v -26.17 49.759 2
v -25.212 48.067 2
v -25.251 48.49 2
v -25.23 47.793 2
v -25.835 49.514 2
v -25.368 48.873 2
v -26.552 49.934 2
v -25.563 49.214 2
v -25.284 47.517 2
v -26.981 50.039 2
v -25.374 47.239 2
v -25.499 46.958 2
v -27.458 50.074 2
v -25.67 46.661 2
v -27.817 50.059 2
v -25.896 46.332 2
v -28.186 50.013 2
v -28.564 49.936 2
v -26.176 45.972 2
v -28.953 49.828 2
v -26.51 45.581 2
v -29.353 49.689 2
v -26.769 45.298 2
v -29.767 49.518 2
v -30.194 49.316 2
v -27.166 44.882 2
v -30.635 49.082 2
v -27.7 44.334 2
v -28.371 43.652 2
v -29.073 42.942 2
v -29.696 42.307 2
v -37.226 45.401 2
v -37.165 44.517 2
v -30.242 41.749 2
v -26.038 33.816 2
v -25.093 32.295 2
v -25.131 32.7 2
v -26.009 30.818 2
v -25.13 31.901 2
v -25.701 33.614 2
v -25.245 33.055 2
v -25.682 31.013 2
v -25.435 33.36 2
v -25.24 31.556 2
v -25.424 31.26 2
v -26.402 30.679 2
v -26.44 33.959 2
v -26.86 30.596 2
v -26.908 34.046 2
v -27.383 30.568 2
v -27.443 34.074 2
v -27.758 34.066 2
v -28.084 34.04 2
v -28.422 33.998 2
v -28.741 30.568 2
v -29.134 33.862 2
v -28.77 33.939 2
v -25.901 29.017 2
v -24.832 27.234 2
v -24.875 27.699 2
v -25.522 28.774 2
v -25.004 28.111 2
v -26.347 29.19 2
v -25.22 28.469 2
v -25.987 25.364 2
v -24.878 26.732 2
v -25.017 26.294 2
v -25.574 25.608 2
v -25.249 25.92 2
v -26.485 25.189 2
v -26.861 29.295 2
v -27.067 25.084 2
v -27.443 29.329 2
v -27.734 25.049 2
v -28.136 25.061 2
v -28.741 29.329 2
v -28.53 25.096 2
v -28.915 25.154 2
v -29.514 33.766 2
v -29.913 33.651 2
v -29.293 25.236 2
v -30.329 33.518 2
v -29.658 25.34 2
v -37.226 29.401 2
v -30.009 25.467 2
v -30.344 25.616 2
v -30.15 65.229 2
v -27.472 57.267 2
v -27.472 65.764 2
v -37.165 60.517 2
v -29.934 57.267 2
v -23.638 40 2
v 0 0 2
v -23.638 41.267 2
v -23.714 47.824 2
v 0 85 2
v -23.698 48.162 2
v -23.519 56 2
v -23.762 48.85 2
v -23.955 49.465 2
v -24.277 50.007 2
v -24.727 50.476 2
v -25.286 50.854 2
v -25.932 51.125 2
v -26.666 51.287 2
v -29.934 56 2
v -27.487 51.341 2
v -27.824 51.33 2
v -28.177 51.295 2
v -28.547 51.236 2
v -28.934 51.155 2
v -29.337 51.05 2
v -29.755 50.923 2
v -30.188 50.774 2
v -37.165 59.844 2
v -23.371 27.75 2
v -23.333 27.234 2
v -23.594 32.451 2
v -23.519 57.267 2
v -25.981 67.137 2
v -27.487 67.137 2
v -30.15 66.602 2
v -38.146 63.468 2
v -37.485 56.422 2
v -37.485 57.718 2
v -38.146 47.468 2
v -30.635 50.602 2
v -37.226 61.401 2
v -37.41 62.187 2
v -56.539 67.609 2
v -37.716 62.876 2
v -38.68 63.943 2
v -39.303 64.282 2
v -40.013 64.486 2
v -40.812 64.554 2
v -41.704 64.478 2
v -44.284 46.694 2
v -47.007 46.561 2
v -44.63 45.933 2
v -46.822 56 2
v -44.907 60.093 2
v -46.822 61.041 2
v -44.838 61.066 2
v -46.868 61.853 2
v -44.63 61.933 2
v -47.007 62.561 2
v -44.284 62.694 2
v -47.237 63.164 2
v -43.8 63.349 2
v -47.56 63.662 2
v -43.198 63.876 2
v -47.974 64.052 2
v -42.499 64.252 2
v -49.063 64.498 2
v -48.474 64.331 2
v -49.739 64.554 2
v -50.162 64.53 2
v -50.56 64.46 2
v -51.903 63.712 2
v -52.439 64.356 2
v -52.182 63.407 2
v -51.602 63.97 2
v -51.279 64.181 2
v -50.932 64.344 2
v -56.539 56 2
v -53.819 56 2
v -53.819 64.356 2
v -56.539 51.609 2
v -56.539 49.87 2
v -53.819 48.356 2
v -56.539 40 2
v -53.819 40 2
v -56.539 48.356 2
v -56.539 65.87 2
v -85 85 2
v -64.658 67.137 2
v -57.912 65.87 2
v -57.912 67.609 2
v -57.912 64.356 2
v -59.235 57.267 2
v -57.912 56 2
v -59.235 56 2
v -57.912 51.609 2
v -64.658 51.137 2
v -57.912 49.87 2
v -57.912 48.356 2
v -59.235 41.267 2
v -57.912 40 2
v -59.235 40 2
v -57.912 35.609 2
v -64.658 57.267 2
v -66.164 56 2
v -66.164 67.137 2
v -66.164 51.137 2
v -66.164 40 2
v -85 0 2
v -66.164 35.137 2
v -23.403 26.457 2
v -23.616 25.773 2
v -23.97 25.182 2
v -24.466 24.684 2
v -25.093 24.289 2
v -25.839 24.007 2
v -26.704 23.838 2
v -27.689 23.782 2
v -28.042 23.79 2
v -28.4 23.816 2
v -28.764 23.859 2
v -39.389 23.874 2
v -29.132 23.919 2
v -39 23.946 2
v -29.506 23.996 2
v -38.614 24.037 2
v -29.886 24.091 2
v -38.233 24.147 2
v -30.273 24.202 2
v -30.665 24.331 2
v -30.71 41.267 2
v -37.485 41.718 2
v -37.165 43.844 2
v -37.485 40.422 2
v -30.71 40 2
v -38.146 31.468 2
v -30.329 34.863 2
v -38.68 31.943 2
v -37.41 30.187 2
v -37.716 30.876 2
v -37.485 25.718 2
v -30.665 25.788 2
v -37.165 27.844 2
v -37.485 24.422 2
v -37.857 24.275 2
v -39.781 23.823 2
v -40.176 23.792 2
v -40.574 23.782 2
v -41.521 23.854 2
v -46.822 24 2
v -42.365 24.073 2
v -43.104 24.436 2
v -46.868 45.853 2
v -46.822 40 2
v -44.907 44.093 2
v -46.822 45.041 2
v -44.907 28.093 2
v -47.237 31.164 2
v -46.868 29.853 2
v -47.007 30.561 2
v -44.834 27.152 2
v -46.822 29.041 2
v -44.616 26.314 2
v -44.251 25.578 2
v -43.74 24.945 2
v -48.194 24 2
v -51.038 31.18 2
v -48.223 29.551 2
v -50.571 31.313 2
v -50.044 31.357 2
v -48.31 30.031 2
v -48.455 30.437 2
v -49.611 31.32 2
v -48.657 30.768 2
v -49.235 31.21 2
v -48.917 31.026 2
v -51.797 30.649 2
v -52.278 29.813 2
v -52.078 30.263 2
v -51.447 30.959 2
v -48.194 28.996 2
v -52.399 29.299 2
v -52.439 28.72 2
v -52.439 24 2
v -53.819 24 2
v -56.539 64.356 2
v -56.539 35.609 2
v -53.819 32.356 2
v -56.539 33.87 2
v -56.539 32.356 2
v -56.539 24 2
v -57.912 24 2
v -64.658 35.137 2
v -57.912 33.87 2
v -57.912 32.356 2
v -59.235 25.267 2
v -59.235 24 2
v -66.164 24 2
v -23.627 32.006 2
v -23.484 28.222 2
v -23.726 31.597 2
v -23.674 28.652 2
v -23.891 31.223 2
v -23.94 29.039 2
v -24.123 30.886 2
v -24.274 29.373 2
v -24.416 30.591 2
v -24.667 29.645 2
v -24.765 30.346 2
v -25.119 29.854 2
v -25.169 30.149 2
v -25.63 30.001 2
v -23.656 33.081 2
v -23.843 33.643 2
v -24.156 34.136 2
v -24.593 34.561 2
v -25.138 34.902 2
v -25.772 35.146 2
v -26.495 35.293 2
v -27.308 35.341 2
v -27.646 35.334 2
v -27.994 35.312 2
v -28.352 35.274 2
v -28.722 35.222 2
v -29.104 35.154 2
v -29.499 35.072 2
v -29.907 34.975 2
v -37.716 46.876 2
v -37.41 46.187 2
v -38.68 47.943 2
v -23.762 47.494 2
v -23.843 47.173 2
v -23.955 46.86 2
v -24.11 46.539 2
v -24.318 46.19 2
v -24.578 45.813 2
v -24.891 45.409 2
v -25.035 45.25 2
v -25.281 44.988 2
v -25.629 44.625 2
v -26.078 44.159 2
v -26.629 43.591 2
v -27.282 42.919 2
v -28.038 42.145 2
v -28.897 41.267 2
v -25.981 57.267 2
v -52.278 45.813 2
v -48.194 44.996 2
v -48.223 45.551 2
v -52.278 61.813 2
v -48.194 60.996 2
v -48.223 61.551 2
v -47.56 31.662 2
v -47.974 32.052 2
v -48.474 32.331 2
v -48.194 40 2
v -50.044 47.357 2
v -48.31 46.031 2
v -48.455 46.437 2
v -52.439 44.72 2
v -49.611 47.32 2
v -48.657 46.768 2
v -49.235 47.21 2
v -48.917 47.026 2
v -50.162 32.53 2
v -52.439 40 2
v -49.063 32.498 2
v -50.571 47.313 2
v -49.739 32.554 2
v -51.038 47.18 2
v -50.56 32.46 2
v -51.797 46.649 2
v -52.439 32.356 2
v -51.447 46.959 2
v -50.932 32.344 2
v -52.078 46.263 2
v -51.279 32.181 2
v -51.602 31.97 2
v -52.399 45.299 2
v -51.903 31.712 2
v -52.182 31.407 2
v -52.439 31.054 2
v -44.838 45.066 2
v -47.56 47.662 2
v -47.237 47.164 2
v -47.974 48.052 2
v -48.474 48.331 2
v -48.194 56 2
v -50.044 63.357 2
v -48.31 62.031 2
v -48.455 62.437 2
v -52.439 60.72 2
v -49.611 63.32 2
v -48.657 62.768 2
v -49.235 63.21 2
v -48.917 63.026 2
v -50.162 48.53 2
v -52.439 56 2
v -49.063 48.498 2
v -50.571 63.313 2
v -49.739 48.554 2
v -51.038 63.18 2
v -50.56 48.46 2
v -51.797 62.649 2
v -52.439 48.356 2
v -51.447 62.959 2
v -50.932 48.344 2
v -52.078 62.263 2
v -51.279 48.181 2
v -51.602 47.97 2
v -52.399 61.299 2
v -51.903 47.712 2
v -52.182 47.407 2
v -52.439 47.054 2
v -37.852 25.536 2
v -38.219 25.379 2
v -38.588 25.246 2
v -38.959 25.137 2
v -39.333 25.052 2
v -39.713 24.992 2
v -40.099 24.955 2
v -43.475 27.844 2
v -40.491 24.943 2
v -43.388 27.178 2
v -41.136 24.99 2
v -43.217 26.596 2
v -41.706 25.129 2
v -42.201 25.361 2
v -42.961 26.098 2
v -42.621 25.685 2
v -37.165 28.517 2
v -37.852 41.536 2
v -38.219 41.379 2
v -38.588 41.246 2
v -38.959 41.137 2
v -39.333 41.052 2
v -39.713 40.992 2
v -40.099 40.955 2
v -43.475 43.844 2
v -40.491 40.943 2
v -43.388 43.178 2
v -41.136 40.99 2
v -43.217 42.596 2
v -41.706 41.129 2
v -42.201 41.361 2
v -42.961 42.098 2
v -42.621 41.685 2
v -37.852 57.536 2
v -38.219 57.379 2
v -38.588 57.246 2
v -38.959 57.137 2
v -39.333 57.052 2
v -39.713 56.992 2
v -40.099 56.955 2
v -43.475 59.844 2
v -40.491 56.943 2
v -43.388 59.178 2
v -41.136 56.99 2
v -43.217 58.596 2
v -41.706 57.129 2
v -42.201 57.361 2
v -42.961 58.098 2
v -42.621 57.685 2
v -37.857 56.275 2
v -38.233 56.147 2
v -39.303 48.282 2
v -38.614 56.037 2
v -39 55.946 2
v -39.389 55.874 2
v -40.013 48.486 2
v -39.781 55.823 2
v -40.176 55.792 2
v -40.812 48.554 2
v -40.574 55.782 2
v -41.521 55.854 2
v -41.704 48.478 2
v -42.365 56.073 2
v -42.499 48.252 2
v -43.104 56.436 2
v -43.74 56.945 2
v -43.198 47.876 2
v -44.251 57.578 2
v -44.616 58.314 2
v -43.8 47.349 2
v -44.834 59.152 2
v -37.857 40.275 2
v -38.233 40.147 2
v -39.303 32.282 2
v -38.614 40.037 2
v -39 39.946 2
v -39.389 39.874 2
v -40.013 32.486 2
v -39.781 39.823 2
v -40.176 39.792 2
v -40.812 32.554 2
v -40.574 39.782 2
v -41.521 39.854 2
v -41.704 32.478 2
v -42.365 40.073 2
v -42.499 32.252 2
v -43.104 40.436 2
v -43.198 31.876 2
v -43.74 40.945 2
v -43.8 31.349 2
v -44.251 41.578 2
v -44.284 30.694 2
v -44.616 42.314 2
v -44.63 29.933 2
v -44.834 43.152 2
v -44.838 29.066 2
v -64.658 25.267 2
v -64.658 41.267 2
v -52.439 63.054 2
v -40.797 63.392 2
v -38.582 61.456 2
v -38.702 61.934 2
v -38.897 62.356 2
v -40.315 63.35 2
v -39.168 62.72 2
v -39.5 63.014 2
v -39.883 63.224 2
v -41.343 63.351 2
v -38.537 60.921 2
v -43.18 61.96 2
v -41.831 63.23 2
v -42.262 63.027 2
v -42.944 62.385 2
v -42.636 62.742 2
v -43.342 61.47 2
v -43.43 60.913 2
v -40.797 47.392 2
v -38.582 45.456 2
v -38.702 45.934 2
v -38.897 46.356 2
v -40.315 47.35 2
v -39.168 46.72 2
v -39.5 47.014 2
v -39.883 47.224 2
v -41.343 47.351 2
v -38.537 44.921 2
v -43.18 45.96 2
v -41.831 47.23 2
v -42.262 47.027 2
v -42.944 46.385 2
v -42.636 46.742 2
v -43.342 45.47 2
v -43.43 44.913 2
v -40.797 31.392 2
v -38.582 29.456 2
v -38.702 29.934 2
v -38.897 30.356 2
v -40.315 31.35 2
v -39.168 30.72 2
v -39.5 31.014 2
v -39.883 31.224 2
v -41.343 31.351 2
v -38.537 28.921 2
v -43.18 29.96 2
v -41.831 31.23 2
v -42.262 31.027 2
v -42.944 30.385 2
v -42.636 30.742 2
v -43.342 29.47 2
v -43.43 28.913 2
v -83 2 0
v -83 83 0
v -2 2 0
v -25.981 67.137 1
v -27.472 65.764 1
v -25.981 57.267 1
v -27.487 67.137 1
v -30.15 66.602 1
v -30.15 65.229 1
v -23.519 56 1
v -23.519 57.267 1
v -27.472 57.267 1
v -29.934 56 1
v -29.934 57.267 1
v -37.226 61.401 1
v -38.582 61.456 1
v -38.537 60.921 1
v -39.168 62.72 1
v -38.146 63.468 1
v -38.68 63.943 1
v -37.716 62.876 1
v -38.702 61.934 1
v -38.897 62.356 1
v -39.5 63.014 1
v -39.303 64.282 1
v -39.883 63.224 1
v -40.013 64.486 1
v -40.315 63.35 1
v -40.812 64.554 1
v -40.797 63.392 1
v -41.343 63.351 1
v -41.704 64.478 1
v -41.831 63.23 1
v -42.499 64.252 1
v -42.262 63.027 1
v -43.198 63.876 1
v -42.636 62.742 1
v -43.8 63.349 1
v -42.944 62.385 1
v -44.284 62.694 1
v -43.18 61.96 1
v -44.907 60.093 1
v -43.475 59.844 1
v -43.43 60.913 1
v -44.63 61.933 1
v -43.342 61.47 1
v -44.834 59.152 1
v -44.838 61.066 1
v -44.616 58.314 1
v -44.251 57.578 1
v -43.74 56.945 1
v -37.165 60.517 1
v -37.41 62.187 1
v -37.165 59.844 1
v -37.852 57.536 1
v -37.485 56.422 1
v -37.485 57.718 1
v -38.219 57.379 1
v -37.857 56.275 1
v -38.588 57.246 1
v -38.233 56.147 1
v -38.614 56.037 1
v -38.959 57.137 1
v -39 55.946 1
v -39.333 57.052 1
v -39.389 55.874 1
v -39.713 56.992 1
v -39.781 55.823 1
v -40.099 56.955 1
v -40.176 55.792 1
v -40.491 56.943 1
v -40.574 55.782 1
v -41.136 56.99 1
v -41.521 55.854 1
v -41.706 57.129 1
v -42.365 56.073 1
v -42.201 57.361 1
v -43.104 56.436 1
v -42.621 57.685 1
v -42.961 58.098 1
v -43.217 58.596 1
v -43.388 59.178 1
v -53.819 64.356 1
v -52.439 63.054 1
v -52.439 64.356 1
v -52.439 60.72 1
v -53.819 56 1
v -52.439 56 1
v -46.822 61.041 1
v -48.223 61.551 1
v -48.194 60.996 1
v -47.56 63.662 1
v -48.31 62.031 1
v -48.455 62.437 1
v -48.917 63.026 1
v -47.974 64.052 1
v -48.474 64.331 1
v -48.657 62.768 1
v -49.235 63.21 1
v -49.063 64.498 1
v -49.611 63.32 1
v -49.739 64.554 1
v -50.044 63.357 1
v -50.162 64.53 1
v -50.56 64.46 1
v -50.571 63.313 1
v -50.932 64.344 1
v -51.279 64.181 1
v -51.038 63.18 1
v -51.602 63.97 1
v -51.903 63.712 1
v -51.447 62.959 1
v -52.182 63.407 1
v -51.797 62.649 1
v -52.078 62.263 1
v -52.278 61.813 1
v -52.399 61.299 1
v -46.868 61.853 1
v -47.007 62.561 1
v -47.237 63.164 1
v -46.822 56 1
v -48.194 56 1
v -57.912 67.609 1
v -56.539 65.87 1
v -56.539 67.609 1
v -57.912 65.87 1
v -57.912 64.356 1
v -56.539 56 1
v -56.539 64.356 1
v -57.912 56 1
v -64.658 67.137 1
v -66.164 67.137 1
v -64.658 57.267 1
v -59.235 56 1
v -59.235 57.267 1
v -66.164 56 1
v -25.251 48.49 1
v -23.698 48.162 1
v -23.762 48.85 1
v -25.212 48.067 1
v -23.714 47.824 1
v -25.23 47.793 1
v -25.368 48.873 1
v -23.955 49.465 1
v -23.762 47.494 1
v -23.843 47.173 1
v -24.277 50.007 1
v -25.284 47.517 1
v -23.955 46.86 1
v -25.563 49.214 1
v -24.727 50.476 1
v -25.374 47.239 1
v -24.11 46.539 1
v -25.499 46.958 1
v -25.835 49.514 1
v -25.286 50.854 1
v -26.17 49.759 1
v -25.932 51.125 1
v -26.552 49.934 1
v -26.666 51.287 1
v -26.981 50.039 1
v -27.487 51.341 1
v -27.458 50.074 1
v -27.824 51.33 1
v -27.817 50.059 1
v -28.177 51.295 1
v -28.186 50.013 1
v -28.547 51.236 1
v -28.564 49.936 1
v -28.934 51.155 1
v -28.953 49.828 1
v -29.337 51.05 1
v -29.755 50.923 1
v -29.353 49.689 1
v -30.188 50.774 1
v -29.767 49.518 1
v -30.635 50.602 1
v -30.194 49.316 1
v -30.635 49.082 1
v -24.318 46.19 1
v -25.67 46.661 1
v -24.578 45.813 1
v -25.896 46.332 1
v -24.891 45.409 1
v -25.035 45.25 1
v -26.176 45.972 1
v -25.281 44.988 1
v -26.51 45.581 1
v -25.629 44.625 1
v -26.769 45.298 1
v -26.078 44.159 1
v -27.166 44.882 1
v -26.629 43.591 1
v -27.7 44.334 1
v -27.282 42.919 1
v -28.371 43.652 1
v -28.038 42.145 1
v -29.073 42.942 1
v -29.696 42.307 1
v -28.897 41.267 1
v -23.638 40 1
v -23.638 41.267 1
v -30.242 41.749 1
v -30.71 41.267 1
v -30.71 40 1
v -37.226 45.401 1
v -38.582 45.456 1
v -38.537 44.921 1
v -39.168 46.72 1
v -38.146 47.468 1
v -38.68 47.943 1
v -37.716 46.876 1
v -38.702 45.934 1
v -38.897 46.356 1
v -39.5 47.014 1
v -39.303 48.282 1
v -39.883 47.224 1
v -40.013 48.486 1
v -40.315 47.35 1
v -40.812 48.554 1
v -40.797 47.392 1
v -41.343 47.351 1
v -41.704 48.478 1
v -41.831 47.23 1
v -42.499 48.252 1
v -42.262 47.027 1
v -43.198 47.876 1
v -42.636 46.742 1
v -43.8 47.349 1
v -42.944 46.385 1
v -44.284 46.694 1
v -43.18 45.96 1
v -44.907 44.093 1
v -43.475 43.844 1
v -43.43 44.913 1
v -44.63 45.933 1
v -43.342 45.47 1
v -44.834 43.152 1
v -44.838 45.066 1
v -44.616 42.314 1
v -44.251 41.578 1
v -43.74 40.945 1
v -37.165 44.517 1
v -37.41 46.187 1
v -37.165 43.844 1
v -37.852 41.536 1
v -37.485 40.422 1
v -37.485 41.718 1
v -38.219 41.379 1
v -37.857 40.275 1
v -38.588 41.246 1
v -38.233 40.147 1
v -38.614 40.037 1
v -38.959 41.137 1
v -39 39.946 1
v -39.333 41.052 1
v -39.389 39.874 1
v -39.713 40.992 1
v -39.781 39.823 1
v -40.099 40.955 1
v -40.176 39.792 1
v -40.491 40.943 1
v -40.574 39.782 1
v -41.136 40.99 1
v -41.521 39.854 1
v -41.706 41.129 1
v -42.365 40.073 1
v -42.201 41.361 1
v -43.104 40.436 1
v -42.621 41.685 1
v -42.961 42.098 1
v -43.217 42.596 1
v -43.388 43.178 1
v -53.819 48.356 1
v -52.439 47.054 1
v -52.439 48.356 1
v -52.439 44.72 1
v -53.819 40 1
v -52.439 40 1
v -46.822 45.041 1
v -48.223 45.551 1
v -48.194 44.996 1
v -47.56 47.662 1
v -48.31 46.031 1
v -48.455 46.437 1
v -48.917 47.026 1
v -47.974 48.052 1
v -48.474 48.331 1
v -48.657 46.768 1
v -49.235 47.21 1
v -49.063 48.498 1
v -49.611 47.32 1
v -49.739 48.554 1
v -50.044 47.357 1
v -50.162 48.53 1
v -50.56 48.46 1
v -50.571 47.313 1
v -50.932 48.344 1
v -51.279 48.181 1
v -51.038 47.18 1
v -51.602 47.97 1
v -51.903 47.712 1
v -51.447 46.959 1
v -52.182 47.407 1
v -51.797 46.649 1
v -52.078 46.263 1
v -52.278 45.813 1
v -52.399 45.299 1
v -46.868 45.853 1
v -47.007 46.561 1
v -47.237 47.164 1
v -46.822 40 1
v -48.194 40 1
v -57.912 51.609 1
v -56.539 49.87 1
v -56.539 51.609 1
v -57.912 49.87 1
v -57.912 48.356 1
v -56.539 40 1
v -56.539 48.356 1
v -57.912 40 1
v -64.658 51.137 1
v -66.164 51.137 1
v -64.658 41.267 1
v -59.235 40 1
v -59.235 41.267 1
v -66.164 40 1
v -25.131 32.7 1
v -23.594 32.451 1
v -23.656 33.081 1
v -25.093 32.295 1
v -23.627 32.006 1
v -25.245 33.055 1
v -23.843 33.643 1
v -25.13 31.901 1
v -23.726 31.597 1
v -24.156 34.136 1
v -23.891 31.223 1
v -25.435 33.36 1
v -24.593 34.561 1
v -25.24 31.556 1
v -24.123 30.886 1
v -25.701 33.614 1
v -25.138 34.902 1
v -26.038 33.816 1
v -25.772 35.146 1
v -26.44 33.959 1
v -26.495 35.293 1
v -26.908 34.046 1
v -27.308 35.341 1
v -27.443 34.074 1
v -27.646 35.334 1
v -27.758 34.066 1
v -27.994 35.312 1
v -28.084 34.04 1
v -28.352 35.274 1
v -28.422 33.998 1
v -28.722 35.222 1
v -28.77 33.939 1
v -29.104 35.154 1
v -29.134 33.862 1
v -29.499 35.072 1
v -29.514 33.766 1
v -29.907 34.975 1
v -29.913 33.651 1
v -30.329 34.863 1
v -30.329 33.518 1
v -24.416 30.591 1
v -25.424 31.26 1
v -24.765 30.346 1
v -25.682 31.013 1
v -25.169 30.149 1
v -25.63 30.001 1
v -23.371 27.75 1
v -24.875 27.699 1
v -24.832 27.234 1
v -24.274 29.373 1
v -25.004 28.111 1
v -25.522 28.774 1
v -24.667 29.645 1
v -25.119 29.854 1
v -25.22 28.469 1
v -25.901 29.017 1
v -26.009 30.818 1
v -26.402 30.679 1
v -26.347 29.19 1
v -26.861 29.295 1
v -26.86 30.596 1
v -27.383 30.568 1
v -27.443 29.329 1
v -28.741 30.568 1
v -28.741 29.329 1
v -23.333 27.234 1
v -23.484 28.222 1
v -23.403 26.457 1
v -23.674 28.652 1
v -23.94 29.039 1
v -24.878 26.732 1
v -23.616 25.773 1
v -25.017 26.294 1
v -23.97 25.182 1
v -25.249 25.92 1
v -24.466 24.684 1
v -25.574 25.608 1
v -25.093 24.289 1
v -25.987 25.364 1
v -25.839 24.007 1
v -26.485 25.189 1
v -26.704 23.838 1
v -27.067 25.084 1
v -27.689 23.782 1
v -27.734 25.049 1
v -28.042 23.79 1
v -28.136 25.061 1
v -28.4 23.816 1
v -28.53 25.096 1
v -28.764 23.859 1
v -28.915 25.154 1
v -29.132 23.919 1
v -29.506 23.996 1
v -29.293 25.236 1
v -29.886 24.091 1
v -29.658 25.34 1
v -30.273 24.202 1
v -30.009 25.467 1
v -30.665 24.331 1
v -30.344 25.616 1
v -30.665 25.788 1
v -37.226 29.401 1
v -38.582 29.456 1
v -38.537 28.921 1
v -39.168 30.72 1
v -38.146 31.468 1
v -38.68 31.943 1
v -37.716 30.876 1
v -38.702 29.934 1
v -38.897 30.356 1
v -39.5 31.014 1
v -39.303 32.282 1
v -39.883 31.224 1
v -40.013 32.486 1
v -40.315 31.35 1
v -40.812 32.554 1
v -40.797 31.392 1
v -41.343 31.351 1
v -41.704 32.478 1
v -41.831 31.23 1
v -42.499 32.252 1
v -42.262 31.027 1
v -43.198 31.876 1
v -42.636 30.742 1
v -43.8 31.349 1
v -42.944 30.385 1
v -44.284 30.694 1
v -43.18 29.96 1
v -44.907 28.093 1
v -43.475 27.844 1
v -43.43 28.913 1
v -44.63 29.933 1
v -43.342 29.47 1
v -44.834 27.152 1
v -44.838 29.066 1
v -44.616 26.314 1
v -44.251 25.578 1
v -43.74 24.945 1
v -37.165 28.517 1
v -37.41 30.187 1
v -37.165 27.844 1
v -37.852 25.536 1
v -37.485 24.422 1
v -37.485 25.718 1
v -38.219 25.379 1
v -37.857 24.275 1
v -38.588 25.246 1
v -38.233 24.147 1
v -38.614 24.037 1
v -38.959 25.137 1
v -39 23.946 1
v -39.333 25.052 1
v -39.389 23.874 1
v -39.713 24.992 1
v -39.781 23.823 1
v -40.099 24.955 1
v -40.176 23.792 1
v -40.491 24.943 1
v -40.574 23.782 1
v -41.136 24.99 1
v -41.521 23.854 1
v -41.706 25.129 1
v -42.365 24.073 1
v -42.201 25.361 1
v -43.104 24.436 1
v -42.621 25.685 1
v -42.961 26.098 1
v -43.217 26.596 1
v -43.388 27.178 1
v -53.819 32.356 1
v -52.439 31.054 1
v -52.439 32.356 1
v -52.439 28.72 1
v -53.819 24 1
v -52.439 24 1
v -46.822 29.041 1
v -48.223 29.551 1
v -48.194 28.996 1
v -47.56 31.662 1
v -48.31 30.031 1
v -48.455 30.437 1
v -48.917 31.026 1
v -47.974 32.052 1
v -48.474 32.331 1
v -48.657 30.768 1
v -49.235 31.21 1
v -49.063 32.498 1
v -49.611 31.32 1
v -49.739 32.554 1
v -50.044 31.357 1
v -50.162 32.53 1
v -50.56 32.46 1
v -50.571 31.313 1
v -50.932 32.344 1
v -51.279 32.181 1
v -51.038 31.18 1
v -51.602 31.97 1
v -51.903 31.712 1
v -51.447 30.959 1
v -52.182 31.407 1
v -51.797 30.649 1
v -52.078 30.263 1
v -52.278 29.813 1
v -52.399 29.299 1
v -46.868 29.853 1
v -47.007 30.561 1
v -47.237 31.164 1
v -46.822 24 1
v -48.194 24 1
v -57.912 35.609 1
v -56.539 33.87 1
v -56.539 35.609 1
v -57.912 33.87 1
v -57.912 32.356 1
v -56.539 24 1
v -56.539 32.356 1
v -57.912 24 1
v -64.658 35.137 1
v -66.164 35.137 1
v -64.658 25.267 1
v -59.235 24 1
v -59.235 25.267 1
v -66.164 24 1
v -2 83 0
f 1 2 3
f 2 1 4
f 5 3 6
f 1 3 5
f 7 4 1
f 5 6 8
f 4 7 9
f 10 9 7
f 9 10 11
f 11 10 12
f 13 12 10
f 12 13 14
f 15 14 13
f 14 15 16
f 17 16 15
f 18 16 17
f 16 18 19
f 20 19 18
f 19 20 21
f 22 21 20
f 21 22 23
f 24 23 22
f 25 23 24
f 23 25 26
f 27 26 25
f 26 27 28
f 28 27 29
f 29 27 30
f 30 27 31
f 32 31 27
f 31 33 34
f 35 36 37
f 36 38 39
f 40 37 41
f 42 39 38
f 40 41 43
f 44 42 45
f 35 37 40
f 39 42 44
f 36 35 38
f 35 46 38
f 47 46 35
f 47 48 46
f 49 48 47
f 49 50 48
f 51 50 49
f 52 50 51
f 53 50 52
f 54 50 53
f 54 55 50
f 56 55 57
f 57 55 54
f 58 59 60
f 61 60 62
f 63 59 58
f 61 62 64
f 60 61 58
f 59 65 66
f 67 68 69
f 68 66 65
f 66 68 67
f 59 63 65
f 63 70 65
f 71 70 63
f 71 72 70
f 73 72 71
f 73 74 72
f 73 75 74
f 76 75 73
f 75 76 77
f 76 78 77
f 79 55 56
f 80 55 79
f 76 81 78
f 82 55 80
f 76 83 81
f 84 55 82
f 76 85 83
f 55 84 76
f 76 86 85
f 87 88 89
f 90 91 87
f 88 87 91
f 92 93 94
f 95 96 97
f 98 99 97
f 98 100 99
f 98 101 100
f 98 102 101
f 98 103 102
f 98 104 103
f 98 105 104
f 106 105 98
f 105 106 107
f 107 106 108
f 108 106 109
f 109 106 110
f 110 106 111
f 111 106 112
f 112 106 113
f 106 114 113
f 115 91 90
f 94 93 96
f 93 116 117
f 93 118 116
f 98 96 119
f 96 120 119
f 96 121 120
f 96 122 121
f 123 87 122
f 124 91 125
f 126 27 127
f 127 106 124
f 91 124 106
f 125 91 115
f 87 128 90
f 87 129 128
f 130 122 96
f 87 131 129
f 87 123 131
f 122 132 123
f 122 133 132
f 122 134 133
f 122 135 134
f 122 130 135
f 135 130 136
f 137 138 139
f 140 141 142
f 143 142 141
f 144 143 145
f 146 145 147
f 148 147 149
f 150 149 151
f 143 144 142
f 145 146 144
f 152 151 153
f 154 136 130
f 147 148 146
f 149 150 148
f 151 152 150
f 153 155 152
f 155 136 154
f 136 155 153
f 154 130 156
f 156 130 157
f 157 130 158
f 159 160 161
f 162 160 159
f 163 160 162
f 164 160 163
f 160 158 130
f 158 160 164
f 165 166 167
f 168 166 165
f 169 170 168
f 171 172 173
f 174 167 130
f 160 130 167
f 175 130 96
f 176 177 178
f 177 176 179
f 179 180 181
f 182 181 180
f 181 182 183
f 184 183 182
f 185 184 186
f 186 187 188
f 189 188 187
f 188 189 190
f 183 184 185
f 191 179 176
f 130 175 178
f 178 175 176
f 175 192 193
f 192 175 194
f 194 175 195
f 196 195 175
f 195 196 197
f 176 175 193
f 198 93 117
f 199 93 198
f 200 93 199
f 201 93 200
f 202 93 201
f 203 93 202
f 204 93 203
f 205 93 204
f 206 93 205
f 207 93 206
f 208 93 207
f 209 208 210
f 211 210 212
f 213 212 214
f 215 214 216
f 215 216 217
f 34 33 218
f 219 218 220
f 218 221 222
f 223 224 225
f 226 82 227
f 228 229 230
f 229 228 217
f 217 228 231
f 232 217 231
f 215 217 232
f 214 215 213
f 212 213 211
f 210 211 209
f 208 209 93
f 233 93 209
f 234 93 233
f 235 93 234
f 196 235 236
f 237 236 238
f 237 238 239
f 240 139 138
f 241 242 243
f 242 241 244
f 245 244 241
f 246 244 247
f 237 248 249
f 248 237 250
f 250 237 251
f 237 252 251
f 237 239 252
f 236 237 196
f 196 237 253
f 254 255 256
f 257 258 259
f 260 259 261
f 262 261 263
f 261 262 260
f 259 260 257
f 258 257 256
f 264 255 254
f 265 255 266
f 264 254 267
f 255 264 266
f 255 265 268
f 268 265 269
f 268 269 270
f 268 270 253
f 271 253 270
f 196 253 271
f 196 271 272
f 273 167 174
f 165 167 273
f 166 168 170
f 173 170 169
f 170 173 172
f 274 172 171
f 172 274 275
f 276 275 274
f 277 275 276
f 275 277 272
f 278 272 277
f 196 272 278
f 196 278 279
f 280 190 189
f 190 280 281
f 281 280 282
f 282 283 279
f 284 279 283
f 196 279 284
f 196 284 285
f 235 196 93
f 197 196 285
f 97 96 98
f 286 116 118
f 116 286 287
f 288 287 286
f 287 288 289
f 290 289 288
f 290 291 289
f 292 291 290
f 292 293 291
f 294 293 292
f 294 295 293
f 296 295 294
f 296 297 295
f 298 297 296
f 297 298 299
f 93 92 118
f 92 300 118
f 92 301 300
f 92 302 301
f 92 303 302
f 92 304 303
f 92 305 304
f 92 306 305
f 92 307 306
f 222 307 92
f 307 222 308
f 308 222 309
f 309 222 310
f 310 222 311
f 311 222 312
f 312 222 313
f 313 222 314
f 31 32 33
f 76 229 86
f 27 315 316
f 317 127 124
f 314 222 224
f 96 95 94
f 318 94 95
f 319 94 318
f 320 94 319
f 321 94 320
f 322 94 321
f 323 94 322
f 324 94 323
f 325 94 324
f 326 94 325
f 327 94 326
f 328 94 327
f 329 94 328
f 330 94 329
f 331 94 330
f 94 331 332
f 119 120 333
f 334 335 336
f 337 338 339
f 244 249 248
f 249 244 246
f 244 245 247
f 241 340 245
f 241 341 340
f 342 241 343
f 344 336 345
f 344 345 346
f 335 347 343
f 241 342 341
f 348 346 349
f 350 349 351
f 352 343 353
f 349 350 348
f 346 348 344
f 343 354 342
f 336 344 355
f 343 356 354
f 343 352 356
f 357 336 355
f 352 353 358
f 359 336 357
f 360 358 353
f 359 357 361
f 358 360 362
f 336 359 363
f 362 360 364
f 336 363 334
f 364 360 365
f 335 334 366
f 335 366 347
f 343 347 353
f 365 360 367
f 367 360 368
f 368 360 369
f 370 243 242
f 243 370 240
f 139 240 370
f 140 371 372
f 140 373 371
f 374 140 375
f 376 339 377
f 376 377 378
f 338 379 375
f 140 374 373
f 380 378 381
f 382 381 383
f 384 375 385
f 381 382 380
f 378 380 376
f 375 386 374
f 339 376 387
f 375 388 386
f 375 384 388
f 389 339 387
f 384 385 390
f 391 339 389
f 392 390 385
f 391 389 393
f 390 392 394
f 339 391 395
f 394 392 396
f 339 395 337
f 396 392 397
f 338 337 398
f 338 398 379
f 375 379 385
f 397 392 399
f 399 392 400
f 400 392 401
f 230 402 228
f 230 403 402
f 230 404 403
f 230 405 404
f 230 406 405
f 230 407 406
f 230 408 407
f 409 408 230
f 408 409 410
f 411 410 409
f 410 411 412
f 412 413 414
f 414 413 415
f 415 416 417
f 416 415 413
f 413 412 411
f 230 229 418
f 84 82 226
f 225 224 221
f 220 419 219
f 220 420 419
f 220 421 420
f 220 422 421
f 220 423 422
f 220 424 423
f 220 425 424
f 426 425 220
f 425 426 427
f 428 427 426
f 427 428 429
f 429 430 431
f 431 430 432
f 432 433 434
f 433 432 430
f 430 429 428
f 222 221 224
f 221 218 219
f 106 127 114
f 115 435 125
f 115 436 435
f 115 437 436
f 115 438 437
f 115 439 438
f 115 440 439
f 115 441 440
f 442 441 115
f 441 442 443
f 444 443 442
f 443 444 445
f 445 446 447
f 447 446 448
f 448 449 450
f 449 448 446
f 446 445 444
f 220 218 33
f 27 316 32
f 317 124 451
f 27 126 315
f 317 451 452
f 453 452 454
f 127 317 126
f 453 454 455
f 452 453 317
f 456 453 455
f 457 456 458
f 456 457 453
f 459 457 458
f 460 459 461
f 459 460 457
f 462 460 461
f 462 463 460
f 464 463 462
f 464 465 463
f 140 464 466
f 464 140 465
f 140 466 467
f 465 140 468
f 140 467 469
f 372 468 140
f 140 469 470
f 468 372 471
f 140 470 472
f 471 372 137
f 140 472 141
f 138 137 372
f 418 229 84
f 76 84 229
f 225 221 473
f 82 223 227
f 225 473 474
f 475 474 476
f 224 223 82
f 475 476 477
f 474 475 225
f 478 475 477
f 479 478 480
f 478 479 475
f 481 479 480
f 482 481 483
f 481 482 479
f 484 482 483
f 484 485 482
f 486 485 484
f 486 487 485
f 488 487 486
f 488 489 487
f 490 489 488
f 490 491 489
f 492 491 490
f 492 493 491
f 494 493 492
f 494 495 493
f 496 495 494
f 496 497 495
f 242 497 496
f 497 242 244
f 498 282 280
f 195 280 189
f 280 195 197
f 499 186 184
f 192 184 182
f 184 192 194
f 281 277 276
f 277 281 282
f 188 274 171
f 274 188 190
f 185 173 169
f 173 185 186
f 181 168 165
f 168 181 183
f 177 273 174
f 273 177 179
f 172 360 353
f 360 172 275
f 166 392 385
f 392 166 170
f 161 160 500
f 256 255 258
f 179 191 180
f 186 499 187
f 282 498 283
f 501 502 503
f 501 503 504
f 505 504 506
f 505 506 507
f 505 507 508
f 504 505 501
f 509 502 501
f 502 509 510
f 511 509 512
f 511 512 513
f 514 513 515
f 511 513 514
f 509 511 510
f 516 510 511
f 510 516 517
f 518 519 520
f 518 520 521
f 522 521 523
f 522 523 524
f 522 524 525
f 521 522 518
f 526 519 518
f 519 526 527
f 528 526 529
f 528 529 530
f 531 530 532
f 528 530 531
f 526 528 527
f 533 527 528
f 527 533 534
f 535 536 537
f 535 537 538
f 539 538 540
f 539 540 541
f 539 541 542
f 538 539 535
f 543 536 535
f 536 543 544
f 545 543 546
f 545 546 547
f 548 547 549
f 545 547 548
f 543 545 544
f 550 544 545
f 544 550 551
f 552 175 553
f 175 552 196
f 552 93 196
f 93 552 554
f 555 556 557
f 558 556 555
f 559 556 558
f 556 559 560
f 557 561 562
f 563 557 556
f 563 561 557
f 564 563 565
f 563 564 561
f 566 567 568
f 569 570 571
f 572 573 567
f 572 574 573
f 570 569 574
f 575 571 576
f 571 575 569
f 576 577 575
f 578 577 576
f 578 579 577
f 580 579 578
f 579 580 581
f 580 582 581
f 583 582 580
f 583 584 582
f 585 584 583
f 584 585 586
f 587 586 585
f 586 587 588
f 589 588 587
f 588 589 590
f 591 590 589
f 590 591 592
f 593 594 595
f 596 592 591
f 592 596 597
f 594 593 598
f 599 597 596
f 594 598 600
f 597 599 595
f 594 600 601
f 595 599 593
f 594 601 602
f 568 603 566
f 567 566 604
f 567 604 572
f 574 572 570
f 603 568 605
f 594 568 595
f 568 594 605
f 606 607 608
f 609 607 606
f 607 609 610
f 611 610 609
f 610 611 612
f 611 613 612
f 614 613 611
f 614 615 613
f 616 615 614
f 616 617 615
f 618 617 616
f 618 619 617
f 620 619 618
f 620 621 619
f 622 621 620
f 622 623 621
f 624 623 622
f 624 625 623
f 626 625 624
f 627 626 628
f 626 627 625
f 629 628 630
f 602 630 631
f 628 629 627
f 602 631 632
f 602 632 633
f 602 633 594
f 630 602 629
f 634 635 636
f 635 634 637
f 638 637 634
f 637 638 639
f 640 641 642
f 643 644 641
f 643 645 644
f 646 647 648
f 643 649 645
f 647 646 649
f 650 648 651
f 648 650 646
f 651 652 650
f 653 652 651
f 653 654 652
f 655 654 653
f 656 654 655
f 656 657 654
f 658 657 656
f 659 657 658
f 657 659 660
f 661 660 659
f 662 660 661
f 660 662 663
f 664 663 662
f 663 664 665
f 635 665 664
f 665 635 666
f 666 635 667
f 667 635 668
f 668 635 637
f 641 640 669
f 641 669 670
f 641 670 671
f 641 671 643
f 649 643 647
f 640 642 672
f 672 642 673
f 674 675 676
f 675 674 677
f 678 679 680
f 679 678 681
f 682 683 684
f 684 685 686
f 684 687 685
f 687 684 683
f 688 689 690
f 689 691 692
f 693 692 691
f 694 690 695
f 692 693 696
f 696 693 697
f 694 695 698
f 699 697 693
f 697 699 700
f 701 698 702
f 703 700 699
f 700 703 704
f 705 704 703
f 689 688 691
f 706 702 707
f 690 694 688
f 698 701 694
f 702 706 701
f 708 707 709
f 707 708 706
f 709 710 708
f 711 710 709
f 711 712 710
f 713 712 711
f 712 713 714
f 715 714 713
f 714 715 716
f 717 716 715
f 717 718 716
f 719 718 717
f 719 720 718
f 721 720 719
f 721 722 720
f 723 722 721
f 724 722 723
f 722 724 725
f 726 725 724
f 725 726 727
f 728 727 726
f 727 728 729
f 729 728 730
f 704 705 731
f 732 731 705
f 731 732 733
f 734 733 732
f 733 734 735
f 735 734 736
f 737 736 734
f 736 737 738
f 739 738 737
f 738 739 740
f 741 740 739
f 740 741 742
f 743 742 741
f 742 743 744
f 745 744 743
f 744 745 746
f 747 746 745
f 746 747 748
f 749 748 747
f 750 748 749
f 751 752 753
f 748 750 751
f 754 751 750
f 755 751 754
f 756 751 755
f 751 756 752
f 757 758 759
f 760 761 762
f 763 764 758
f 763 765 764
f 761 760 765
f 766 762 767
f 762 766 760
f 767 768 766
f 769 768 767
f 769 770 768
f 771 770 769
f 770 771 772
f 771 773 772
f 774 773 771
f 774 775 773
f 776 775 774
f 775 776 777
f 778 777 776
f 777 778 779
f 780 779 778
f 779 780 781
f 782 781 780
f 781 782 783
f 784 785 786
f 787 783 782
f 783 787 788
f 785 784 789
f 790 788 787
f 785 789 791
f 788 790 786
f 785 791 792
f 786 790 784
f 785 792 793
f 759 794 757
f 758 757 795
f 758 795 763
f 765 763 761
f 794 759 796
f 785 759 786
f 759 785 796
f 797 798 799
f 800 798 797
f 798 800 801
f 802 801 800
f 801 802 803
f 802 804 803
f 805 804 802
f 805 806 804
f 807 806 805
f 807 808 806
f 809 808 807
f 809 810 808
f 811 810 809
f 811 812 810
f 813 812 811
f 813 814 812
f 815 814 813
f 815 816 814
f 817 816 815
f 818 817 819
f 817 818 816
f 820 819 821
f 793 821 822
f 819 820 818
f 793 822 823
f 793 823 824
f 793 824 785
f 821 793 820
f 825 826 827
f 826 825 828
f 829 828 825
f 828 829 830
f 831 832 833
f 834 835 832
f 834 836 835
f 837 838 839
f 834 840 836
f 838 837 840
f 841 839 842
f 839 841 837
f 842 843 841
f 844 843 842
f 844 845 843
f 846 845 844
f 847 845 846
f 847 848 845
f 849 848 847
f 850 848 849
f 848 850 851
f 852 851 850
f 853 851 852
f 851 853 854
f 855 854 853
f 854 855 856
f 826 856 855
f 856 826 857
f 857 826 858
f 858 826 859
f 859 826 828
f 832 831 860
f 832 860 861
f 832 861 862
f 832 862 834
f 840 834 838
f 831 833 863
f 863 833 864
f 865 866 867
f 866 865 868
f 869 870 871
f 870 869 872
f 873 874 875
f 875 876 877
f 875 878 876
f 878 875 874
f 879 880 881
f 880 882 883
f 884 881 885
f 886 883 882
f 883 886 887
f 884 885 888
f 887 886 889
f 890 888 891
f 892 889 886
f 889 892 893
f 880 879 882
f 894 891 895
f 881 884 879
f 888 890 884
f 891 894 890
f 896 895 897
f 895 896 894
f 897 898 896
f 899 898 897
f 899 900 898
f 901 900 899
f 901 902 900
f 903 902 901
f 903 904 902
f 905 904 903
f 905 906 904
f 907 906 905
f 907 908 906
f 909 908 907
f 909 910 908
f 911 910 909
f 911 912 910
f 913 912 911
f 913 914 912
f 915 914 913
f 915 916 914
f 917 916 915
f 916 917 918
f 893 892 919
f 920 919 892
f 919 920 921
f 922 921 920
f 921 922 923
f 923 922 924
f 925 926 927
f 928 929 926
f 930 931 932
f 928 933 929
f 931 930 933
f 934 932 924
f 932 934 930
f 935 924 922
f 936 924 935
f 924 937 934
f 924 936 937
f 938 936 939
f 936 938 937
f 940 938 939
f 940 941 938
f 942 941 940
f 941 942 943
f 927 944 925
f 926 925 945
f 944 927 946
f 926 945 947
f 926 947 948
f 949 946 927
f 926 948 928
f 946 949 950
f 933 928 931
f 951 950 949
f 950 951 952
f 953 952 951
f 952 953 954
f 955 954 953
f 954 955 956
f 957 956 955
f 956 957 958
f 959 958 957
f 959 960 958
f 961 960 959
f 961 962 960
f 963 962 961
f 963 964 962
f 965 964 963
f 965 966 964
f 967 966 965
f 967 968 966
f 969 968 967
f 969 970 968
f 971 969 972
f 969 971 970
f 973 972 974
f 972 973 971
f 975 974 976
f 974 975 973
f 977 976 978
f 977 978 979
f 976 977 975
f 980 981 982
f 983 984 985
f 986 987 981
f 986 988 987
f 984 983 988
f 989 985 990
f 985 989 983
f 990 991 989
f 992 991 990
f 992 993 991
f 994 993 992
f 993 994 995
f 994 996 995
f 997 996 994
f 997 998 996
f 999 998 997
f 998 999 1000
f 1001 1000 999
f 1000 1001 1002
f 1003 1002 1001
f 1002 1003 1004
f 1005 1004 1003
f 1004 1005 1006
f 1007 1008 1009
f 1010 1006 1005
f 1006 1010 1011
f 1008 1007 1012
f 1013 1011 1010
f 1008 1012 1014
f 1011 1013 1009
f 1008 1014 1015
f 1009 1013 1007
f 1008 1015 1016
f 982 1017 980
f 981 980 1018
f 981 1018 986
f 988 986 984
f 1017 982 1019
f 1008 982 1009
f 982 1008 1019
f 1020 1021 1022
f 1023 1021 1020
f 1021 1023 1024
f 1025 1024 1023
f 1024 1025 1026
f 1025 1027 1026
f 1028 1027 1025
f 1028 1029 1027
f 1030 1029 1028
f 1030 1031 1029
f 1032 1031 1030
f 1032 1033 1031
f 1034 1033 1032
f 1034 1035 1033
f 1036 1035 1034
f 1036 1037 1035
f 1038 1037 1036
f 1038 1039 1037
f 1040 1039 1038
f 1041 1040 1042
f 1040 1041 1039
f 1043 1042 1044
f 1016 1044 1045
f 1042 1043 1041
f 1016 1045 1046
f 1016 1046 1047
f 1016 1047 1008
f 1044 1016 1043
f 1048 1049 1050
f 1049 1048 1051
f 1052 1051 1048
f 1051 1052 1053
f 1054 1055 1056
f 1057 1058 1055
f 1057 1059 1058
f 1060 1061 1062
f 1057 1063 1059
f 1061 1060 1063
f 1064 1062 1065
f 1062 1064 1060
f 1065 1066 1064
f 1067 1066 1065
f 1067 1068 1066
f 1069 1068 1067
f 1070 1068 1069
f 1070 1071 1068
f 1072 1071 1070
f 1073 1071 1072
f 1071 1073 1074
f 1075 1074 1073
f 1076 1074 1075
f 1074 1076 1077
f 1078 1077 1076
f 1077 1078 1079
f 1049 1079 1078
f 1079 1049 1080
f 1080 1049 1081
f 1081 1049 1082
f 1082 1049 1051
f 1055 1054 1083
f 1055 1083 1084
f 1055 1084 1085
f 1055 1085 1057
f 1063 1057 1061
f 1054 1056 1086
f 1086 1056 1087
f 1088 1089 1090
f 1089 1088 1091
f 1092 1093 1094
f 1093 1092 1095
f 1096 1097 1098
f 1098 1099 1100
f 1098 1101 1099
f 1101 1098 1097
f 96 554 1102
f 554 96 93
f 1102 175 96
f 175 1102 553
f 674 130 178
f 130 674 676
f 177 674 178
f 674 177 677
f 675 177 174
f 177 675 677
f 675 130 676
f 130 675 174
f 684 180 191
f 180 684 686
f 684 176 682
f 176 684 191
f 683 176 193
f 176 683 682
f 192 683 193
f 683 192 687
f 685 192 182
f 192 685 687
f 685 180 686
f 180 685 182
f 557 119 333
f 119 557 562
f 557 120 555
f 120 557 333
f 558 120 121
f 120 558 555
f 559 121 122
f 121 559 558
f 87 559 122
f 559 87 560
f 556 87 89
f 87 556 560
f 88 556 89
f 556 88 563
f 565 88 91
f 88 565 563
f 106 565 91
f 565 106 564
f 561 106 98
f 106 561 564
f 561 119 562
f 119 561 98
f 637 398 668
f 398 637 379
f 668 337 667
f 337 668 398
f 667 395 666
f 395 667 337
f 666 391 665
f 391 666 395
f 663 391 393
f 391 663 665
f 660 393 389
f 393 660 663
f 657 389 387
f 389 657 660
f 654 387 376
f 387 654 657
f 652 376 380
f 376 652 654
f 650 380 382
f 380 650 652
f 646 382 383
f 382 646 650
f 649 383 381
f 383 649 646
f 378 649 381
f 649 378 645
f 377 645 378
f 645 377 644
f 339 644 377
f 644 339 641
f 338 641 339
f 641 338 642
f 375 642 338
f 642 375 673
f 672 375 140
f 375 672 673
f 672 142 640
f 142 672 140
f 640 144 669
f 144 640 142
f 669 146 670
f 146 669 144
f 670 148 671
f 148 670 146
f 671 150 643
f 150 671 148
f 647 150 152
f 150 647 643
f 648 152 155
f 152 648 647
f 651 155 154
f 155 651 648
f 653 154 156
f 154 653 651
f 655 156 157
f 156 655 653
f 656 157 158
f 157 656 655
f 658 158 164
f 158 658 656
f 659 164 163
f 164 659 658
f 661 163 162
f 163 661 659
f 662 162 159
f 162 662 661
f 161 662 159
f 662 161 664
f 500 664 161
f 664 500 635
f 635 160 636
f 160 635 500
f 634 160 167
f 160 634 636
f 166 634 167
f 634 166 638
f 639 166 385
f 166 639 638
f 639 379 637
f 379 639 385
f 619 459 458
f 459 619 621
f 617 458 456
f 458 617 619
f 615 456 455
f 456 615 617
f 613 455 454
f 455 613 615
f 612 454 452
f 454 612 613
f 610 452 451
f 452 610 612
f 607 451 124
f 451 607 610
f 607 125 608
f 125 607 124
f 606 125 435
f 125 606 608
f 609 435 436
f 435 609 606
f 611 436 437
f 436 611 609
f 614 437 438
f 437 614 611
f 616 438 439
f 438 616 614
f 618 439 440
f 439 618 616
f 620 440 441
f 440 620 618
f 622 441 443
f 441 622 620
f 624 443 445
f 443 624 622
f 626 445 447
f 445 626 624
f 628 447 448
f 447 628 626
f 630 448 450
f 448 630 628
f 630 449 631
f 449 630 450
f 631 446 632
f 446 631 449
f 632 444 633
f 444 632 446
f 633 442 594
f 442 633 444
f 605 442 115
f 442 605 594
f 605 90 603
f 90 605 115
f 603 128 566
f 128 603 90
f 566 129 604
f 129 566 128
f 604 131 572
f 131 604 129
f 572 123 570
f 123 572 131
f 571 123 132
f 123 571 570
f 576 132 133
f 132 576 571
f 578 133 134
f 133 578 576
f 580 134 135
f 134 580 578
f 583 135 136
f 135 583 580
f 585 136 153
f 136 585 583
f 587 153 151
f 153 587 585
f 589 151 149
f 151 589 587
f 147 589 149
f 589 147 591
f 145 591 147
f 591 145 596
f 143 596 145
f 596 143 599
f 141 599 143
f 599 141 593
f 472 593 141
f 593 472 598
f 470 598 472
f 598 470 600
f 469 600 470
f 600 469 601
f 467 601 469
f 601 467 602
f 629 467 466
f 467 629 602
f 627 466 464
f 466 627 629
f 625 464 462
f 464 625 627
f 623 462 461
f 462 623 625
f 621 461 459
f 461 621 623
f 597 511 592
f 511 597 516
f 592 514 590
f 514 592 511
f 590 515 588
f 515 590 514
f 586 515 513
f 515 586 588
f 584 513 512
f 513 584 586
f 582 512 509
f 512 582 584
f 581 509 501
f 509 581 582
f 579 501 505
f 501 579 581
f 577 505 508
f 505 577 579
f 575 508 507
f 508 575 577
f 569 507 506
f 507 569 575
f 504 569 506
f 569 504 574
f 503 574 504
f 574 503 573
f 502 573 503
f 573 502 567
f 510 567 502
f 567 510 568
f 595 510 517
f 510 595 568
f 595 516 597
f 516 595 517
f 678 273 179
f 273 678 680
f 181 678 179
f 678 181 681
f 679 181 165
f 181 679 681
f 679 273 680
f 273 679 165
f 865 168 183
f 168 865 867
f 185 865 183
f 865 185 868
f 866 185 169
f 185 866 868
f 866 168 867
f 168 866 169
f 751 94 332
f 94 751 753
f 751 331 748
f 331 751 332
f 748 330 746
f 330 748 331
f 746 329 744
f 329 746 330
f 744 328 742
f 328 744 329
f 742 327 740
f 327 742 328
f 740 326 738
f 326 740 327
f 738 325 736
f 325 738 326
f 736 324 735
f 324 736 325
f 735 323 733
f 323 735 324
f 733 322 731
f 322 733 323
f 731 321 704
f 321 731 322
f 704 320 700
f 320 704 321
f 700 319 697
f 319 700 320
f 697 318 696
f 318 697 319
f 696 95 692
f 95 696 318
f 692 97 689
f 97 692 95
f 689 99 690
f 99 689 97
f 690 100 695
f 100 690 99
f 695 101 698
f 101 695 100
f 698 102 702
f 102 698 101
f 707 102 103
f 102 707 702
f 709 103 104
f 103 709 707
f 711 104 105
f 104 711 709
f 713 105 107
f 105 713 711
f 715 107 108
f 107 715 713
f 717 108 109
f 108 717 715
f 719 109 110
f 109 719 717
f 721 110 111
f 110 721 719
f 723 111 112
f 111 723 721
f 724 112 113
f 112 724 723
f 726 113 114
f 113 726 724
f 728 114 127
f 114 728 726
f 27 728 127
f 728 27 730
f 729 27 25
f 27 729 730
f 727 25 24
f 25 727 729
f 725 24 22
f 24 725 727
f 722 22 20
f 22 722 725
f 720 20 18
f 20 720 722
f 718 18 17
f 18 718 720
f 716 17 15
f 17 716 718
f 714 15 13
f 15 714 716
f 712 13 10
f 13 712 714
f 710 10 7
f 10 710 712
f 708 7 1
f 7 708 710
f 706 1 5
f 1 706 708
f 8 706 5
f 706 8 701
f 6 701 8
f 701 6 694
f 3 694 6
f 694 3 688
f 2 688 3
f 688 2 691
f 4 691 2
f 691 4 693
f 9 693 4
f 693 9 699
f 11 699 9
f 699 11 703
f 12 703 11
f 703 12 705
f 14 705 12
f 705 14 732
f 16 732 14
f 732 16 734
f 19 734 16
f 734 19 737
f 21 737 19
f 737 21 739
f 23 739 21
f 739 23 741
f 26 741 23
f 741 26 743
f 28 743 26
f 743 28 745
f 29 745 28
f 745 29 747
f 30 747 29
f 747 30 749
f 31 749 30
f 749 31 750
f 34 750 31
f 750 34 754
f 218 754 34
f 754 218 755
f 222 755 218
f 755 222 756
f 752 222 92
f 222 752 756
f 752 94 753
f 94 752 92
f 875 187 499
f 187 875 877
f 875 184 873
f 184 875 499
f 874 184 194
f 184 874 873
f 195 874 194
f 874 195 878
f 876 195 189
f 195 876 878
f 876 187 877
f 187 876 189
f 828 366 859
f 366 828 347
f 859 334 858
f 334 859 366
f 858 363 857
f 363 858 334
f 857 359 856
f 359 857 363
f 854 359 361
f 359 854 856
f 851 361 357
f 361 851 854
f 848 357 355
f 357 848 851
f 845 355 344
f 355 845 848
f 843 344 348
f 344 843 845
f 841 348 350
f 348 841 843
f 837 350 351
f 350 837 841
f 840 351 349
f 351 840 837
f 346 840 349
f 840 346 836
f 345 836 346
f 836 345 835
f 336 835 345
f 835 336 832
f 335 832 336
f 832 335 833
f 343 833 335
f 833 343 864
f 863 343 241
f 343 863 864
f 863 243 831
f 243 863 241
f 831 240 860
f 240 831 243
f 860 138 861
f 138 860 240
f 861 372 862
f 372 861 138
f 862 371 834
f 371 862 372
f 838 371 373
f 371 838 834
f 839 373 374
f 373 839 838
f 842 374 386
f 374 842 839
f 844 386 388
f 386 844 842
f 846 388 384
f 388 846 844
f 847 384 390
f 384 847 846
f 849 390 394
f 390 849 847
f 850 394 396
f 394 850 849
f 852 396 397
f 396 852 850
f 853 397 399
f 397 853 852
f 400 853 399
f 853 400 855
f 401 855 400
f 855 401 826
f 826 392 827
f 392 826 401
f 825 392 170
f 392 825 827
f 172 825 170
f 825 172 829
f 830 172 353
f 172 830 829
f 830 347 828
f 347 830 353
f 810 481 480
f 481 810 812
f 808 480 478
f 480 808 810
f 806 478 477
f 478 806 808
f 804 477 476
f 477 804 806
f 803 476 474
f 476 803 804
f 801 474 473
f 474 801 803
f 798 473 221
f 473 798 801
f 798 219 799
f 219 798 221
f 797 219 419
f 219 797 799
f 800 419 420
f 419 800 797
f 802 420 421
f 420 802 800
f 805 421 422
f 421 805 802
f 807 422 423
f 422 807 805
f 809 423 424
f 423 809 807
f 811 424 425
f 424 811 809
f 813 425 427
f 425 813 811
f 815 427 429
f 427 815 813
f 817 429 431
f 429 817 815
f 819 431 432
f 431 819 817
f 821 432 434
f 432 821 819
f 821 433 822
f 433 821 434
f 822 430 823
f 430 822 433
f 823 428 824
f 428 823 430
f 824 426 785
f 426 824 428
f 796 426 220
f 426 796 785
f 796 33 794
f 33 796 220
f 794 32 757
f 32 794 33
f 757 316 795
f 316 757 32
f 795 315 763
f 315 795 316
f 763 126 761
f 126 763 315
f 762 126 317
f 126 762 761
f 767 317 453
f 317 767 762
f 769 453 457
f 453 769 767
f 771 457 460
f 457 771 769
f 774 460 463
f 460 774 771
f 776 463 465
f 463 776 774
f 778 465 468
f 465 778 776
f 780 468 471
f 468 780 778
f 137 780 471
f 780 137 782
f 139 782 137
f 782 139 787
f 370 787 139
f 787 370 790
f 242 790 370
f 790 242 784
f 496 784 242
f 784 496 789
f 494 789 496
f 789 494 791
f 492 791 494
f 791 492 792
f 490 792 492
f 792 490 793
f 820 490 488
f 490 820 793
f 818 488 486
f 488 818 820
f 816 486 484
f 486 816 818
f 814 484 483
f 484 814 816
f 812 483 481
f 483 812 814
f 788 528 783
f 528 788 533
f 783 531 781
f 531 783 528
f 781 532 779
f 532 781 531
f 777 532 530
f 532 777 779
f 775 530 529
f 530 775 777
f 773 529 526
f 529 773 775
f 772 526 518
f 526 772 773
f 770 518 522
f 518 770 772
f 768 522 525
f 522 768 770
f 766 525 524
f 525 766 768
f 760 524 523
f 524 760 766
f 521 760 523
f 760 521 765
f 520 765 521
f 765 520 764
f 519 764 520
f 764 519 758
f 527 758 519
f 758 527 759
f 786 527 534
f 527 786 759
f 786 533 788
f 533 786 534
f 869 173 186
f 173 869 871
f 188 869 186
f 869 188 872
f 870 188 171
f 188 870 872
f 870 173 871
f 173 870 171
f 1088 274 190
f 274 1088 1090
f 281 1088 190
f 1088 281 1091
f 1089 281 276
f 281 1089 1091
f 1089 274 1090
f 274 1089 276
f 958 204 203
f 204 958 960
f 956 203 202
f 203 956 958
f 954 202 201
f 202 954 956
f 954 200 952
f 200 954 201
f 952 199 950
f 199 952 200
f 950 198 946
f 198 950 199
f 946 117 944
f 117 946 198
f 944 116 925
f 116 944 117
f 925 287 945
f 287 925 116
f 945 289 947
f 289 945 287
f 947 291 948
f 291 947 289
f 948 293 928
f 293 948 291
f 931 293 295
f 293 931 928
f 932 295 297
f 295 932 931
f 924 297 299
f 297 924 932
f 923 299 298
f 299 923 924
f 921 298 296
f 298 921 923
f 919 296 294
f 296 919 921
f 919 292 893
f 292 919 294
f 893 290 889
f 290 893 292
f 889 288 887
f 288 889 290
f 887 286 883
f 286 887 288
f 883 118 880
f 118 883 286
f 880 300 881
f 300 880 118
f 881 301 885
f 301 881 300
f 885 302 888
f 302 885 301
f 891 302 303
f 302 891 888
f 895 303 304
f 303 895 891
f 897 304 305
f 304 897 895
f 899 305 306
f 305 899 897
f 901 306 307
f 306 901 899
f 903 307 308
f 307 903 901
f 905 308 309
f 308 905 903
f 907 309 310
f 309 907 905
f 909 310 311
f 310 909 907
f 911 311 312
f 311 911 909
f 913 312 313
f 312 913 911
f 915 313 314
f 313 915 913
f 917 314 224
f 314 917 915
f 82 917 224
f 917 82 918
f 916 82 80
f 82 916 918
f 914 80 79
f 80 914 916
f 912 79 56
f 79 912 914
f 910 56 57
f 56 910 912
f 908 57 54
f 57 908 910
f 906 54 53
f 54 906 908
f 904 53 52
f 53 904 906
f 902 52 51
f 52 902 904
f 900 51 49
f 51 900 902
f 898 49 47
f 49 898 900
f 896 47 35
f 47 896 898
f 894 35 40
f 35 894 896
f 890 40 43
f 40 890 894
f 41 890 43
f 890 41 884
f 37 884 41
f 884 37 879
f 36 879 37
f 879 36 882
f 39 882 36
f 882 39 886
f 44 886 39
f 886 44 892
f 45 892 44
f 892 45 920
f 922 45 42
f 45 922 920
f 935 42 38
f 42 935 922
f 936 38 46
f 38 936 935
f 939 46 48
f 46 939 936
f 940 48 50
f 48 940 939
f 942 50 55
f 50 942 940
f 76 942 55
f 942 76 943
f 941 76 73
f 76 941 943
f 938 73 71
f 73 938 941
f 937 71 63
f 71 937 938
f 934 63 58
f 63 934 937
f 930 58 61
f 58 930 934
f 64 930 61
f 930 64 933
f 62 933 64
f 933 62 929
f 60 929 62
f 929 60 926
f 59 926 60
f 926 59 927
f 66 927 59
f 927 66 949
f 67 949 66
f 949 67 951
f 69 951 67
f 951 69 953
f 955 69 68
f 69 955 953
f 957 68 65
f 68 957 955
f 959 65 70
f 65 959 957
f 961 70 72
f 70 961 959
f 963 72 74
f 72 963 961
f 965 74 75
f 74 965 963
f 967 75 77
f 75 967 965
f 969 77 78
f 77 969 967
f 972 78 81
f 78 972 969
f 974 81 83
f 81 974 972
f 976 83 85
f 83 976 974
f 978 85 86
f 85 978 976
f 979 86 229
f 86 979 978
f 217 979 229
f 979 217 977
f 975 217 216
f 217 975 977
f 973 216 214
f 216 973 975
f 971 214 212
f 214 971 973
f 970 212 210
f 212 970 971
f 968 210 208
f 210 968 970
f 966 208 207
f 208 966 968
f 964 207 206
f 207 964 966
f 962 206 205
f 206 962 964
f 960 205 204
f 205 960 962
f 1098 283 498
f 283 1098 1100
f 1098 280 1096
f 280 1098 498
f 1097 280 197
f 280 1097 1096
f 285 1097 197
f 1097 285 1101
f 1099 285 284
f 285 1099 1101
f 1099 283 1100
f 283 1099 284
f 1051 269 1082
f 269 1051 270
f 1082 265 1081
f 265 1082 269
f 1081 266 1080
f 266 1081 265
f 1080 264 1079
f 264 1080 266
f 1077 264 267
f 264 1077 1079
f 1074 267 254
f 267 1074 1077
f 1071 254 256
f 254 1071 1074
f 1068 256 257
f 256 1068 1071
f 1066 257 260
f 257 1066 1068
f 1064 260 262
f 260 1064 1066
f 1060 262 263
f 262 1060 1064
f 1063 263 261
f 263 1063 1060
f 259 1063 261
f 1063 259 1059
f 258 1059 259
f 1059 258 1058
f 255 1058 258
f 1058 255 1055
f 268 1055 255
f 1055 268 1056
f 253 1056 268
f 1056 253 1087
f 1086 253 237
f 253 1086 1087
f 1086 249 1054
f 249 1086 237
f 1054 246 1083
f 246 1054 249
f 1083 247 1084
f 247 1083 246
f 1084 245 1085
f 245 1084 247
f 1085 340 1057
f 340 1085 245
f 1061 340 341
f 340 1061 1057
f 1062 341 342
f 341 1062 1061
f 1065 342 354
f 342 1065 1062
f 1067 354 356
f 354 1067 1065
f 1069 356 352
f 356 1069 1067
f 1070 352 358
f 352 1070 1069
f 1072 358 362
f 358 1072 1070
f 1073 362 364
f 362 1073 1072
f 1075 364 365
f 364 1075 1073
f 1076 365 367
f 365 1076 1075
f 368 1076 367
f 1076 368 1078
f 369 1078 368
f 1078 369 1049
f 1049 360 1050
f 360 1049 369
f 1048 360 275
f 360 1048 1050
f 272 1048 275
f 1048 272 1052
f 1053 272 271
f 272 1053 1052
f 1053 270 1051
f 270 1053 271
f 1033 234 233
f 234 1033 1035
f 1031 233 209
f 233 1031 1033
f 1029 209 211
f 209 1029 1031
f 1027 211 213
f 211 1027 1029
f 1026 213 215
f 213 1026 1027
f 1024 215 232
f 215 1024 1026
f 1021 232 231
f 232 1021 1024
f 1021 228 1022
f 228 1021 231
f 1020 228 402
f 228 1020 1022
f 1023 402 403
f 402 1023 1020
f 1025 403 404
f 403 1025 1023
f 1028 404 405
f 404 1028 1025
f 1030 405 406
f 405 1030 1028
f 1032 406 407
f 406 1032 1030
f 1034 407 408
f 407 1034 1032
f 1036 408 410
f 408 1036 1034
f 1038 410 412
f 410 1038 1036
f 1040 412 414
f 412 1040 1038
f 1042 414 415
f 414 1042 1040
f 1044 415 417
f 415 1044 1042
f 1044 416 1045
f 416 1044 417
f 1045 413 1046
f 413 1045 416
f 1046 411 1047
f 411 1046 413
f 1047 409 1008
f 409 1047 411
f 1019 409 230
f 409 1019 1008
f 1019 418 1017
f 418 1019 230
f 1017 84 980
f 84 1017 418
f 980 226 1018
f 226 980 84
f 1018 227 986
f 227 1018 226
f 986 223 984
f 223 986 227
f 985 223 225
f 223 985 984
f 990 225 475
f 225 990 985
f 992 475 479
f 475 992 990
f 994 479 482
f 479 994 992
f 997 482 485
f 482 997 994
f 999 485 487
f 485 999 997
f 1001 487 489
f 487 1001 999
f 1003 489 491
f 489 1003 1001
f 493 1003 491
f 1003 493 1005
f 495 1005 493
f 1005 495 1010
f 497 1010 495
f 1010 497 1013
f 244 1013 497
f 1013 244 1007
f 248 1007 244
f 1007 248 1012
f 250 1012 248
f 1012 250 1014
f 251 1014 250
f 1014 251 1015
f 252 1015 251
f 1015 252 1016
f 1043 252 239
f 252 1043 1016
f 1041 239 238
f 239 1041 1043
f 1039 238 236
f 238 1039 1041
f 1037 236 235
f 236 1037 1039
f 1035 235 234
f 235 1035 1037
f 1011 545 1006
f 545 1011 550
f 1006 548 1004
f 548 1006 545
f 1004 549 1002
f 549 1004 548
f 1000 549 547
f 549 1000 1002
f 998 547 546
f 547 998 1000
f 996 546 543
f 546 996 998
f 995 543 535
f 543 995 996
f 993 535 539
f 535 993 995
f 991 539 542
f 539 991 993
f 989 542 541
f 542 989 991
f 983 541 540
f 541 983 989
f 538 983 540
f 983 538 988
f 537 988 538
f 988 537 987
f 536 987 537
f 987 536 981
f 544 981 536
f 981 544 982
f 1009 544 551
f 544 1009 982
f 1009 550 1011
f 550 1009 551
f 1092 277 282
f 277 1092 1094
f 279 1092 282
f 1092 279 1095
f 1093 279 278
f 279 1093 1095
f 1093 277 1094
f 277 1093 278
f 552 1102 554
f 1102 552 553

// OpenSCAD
//Generate Bottom or Lower part (dual extruder)

// Which one would you like to see?
part = "both"; // [lower:lower part only,upper:upper part only ,both:lower and upper part]

// Enter your text Line 1
    text_box1 = "Line 1";
// Enter your text Line 2
    text_box2 = "Line 2";
// Enter your text Line 3
    text_box3= "Line 3";
// Enter text size
    text_size= 11; 
 
 
CubeFaces = [
  [0,1,2,3],  // bottom
  [4,5,1,0],  // front
  [7,6,5,4],  // top
  [5,6,2,1],  // right
  [6,7,3,2],  // back
  [7,4,0,3]]; // left

CubePointslower = [
   [  0,  0,  0 ],  //0
  [ 85,  0,  0 ],  //1
  [ 85,  85,  0 ],  //2
  [  0,  85,  0 ],  //3
  [  1,  1,  1 ],  //4
  [84,  1,  1 ],  //5
  [ 84,  84,  1 ],  //6
  [  1,  84,  1 ]]; //7
  
CubePointsHigher = [
[  1,  1,  1 ],  //0
[ 84,  1,  1 ],  //1
[ 84,  84,  1 ],  //2
[  1,  84,  1 ],  //3
[  2,  2,  2 ],  //4
[83,  2,  2 ],  //5
[ 83,  83,  2 ],  //6
[  2,  83,  2 ]]; //7


//CubePointsZwisp = [
//   [  0,  0,  0 ],  //0
//  [ 85,  0,  0 ],  //1
//  [ 85,  85,  0 ],  //2
//  [  0,  85,  0 ],  //3
//  [  2,  2,  2 ],  //4
//  [83,  2,  2 ],  //5
//  [ 83,  83,  2 ],  //6
//  [  2,  83,  2 ]]; //7

//START GENERATING THE OBJECCT
rotate (a=[0,180,0])
translate([0,0,-2]) 
{
{
//GENERATE THE LOWER PLATE
if (part=="both" || part == "upper")
{
color("crimson"){
// create poly
polyhedron( CubePointsHigher, CubeFaces );
}
}
//GENERATE THE UPPER PLATE WITH TEXT
if (part=="both" || part == "lower")
{
difference() {
    // create poly
polyhedron( CubePointslower, CubeFaces );

// text(scale) {
font1 = "Archivo Black"; // here you can select other font type

translate ([45,56,40]) {
rotate ([0,180,0]) {
linear_extrude(height = 60) {
text(text_box1, font = font1, size = text_size, halign="center",  direction = "ltr", spacing = 1 );
    ;
}
}
}
translate ([45,40,40]) {
rotate ([0,180,0]) {
linear_extrude(height = 60) {
text(text_box2, font = font1, size = text_size, halign="center",  direction = "ltr", spacing = 1 );
    ;
}
}
}
translate ([45,24,40]) {
rotate ([0,180,0]) {
linear_extrude(height = 60) {
text(text_box3, font = font1, size = text_size, halign="center",  direction = "ltr", spacing = 1 );
    ;
}
}
}
}
}
}
}
